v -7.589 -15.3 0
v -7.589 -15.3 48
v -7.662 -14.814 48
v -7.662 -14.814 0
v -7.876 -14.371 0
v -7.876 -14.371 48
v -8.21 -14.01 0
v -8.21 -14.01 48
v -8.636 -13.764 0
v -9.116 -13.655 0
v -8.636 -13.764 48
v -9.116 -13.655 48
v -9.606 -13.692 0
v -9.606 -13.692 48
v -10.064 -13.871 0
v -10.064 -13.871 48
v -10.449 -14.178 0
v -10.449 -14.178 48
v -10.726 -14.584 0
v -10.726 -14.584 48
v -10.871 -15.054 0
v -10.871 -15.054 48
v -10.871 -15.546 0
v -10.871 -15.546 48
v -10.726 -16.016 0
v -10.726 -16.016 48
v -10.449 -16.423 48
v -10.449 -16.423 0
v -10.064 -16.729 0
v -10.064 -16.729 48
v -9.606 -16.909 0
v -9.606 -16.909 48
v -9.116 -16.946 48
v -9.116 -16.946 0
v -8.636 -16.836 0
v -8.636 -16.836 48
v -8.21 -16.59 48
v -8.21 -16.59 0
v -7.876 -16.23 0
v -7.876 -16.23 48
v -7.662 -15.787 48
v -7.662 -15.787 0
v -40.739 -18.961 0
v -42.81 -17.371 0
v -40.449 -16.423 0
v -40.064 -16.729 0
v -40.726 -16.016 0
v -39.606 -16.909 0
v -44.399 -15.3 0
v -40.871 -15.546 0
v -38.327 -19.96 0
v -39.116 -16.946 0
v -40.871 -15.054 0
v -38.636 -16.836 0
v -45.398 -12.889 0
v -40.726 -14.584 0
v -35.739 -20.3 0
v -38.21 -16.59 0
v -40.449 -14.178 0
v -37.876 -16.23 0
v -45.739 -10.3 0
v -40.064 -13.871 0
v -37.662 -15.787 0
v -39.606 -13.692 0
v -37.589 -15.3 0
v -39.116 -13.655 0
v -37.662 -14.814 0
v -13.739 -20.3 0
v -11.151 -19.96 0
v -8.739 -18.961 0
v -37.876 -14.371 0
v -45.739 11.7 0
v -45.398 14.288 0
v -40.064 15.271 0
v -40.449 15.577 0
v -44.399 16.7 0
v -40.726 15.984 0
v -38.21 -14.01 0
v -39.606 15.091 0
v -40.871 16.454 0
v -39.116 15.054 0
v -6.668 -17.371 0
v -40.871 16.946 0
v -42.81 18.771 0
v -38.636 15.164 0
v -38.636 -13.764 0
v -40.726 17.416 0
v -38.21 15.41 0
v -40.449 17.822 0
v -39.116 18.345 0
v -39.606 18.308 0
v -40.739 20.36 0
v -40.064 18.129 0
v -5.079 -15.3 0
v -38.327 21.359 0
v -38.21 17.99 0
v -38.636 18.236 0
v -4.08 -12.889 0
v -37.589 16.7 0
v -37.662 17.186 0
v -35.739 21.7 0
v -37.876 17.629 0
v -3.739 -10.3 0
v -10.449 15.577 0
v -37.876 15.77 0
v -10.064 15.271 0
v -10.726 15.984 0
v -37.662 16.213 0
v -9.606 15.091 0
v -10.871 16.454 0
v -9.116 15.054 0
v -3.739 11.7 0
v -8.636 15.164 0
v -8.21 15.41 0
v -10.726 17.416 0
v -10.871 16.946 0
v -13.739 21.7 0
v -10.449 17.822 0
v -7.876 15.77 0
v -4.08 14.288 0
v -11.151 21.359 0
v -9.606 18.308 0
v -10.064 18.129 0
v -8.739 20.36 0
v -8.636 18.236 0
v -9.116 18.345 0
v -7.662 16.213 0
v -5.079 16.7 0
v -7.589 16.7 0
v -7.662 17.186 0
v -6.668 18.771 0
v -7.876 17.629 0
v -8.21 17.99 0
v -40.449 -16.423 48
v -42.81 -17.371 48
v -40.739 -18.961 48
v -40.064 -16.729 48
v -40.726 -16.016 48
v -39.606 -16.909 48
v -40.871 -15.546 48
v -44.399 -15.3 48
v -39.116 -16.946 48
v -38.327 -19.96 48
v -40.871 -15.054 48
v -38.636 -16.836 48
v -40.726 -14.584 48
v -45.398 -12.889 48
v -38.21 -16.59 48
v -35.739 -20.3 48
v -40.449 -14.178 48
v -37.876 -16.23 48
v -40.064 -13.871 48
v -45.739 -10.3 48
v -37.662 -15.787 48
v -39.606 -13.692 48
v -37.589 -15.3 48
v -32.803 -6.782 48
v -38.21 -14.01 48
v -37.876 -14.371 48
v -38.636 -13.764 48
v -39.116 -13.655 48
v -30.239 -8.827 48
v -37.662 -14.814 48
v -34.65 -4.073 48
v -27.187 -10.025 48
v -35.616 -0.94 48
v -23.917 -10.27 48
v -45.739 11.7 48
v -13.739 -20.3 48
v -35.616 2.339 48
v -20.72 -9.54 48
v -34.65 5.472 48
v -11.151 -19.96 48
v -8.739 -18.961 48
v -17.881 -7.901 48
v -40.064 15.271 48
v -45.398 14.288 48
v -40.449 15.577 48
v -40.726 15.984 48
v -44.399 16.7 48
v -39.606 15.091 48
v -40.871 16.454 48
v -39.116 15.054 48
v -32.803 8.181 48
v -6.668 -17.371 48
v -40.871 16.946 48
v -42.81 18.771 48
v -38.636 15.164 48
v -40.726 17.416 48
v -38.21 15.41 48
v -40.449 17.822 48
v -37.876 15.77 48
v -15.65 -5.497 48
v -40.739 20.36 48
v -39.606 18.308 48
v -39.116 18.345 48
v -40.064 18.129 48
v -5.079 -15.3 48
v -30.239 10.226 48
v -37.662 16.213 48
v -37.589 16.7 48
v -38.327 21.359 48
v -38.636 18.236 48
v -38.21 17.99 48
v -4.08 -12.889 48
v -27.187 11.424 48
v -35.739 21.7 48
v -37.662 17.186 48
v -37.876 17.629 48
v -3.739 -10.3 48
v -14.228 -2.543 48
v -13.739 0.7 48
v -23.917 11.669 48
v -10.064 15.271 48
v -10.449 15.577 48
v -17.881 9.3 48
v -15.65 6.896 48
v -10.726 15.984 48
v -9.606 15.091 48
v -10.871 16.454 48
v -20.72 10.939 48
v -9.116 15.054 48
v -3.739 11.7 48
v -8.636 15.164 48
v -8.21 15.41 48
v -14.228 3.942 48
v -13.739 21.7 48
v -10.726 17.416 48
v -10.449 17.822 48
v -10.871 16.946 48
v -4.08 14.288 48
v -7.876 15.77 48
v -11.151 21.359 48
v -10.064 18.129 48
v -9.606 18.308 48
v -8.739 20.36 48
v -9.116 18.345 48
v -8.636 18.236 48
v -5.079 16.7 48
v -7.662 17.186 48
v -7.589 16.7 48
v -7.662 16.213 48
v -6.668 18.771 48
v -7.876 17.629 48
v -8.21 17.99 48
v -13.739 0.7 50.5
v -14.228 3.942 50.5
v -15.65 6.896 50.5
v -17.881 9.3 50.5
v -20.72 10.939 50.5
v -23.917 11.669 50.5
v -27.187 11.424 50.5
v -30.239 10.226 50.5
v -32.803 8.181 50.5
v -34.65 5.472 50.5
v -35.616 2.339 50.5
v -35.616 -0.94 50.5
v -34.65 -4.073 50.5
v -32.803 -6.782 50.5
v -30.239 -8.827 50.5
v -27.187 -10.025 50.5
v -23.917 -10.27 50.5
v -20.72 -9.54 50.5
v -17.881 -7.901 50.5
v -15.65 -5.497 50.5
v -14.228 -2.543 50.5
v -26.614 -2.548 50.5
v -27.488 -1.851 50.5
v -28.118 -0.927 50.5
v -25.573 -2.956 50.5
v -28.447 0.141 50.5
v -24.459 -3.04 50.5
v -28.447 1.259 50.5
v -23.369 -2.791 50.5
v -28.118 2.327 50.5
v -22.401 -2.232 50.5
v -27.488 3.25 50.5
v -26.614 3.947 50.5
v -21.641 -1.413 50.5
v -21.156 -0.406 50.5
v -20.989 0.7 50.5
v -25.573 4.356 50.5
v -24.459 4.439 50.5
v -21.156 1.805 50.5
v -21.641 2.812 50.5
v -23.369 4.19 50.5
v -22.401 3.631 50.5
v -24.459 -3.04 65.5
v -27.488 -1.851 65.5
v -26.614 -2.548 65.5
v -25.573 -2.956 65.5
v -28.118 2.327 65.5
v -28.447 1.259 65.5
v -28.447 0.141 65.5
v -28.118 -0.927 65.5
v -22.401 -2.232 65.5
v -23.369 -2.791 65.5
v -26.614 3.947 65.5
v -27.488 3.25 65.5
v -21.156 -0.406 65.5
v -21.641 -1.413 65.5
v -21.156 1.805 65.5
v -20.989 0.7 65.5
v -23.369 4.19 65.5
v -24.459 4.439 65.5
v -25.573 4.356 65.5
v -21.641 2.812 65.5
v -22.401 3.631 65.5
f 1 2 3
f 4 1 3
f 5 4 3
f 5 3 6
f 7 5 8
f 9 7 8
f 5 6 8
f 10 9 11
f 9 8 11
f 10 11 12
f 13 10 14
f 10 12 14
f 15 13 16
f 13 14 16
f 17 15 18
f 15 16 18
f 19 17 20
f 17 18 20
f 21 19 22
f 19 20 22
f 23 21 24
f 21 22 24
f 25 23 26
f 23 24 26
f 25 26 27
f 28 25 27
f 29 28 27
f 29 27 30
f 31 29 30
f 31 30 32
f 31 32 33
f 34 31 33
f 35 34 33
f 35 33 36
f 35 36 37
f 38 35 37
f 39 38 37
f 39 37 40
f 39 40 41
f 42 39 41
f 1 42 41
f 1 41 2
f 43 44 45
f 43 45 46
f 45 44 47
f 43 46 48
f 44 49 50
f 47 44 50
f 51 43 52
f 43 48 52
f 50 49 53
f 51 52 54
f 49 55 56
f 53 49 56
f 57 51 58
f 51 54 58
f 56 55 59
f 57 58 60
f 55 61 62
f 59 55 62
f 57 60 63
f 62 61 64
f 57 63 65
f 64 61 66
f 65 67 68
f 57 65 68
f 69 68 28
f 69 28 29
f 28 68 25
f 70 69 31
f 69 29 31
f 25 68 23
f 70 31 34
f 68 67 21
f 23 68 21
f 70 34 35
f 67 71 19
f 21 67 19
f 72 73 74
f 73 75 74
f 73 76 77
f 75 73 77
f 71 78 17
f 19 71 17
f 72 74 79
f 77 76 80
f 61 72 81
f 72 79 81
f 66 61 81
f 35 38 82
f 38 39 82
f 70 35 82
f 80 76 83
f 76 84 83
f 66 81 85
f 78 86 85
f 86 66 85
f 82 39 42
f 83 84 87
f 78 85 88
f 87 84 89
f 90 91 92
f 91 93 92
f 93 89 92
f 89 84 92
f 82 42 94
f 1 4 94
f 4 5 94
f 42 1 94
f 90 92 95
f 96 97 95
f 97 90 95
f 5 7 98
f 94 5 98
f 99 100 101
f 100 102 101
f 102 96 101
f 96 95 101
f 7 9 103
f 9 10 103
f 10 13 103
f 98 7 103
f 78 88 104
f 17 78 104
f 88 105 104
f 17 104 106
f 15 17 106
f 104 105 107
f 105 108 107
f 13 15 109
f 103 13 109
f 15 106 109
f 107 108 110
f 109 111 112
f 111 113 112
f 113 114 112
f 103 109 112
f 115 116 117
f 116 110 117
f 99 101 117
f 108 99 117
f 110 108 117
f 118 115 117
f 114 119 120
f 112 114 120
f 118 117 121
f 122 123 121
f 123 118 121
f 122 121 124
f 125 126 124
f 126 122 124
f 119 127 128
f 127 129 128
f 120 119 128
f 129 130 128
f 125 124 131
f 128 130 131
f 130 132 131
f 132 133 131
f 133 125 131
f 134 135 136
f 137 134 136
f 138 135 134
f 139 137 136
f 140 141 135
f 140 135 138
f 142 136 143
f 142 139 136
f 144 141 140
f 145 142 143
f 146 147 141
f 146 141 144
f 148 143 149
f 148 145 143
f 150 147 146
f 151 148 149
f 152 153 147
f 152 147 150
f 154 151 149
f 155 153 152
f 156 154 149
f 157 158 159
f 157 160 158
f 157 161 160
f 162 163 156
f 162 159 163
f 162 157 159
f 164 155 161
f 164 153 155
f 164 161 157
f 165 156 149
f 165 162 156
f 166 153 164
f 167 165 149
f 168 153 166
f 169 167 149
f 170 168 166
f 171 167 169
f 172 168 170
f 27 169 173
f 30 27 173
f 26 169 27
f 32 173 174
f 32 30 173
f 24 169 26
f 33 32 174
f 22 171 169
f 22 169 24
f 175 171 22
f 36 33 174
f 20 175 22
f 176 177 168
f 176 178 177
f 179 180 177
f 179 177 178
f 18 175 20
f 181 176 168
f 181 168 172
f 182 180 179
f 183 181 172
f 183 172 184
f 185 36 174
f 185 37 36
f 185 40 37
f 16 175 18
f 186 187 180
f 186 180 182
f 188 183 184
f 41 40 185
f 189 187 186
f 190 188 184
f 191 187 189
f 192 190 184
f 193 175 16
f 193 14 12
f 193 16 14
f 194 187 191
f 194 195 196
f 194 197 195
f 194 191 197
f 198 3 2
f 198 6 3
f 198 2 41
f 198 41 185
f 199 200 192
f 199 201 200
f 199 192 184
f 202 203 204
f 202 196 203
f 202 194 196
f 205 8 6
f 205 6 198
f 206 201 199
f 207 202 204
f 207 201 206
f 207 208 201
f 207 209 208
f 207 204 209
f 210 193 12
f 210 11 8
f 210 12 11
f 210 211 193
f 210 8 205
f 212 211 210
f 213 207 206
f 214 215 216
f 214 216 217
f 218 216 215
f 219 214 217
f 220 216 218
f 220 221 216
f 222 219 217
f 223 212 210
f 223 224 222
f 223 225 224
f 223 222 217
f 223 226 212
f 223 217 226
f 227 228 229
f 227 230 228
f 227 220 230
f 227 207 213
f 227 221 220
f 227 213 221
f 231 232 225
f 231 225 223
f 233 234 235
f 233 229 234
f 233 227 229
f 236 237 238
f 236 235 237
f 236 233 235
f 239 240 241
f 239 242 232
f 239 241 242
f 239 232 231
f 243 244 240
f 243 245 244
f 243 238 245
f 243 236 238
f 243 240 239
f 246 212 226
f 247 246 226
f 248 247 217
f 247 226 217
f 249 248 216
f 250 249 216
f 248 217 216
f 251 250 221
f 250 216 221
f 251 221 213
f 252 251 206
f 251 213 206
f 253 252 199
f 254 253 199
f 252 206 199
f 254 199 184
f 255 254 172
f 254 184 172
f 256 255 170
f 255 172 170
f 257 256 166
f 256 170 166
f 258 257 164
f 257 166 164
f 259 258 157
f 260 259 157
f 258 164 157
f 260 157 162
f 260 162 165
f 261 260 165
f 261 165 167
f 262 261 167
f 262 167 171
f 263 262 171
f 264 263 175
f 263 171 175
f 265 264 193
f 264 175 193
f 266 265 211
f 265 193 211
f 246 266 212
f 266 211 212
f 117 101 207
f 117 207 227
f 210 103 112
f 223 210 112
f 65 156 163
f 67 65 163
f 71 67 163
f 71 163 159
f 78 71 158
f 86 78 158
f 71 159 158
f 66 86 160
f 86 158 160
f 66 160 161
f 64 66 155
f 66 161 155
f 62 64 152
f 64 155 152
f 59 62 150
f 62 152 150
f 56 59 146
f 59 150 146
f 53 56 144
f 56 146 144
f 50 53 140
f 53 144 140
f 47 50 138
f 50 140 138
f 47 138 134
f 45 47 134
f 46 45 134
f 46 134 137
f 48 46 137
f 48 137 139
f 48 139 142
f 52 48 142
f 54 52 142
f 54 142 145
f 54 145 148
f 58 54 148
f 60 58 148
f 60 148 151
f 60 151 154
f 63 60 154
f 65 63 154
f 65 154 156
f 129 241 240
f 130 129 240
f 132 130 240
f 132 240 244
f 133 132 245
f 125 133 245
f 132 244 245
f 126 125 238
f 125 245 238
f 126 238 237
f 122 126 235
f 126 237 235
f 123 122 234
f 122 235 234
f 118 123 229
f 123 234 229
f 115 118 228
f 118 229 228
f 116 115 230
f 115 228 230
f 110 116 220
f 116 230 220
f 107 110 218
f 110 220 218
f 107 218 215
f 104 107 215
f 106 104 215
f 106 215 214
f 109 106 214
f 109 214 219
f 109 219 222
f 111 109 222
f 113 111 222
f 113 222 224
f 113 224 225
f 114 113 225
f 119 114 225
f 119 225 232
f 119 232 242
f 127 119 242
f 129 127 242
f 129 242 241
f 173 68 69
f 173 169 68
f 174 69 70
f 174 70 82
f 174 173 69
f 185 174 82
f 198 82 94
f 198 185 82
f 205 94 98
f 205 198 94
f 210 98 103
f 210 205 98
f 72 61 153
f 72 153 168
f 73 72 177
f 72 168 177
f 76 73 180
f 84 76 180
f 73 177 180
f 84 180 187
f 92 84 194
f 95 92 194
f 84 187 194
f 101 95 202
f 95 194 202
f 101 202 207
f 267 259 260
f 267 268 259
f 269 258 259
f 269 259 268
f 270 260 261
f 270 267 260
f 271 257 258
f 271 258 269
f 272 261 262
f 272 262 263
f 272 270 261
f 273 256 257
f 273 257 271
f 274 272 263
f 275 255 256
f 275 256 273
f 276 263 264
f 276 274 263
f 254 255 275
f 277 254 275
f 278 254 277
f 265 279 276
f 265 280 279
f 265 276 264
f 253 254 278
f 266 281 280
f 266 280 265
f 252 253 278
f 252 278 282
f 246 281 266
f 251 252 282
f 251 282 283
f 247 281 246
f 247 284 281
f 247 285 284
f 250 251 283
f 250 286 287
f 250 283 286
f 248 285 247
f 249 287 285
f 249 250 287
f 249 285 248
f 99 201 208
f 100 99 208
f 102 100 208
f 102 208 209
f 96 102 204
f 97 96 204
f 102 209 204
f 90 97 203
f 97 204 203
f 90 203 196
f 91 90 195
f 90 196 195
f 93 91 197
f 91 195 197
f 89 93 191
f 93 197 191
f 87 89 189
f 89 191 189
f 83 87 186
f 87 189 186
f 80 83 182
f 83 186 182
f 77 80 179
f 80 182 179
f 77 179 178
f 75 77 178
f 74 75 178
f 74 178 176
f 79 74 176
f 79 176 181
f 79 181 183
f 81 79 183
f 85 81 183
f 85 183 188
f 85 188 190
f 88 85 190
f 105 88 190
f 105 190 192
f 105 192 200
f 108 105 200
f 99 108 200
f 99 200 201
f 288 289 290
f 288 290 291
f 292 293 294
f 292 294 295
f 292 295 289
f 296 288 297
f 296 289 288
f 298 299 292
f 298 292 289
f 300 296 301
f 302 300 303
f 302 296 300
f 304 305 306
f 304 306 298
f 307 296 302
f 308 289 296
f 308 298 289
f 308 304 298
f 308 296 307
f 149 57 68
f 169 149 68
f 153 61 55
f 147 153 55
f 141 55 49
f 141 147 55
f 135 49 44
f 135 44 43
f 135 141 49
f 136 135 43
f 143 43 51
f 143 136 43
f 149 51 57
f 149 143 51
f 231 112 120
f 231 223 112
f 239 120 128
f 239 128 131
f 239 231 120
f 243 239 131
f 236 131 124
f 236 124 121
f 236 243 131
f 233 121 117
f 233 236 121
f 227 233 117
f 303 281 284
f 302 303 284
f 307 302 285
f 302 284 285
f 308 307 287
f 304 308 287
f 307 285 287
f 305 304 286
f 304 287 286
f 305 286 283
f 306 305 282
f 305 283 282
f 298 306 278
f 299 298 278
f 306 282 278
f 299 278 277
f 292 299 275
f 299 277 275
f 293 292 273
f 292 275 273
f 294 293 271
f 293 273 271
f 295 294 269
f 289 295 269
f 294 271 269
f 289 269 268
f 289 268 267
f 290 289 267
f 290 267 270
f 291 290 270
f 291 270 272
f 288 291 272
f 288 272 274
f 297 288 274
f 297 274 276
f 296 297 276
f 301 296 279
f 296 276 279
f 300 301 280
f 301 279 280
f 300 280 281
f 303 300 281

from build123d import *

# Parameters (mm, degrees)
SKETCH_1_W         = 42
SKETCH_1_H         = 42
EXTRUDE_1_DEPTH    = 48
FILLET_1_R         = 10
SKETCH_2_R         = 11
EXTRUDE_2_DEPTH    = 2.5
SKETCH_3_R         = 3.75
EXTRUDE_3_DEPTH    = 15
HOLE_WIZARD_M4_1_D = 3.3


with BuildPart() as part:
    # 草图1 → 凸台-拉伸1 (new body)
    with BuildSketch(Plane.XY):
        with Locations((-24.739017766, 0.699593909)):
            Rectangle(SKETCH_1_W, SKETCH_1_H)
    extrude(amount=EXTRUDE_1_DEPTH)

    # 圆角1
    fillet_1_edges = [part.edges().sort_by_distance(p)[0] for p in [
        (-45.739017766, 21.699593909, 24),
        (-3.739017766, 21.699593909, 24),
        (-3.739017766, -20.300406091, 24),
        (-45.739017766, -20.300406091, 24),
    ]]
    fillet(fillet_1_edges, radius=FILLET_1_R)

    # 草图2 → 凸台-拉伸2 (add)
    with BuildSketch(Plane.XY.offset(48)):
        with Locations((-24.739017766, 0.699593909)):
            Circle(SKETCH_2_R)
    extrude(amount=EXTRUDE_2_DEPTH)

    # 草图3 → 凸台-拉伸3 (add)
    with BuildSketch(Plane.XY.offset(50.5)):
        with Locations((-24.739017766, 0.699593909)):
            Circle(SKETCH_3_R)
    extrude(amount=EXTRUDE_3_DEPTH)

    # M4 螺纹孔1 (through all)
    with Locations(Plane(origin=(0, 0, 0), x_dir=(-1, 0, 0), z_dir=(0, 0, -1))):
        with Locations((9.239017766, 16.699593909), (9.239017766, -15.300406091), (39.239017766, -15.300406091), (39.239017766, 16.699593909)):
            Hole(HOLE_WIZARD_M4_1_D / 2)


solid = part.part
